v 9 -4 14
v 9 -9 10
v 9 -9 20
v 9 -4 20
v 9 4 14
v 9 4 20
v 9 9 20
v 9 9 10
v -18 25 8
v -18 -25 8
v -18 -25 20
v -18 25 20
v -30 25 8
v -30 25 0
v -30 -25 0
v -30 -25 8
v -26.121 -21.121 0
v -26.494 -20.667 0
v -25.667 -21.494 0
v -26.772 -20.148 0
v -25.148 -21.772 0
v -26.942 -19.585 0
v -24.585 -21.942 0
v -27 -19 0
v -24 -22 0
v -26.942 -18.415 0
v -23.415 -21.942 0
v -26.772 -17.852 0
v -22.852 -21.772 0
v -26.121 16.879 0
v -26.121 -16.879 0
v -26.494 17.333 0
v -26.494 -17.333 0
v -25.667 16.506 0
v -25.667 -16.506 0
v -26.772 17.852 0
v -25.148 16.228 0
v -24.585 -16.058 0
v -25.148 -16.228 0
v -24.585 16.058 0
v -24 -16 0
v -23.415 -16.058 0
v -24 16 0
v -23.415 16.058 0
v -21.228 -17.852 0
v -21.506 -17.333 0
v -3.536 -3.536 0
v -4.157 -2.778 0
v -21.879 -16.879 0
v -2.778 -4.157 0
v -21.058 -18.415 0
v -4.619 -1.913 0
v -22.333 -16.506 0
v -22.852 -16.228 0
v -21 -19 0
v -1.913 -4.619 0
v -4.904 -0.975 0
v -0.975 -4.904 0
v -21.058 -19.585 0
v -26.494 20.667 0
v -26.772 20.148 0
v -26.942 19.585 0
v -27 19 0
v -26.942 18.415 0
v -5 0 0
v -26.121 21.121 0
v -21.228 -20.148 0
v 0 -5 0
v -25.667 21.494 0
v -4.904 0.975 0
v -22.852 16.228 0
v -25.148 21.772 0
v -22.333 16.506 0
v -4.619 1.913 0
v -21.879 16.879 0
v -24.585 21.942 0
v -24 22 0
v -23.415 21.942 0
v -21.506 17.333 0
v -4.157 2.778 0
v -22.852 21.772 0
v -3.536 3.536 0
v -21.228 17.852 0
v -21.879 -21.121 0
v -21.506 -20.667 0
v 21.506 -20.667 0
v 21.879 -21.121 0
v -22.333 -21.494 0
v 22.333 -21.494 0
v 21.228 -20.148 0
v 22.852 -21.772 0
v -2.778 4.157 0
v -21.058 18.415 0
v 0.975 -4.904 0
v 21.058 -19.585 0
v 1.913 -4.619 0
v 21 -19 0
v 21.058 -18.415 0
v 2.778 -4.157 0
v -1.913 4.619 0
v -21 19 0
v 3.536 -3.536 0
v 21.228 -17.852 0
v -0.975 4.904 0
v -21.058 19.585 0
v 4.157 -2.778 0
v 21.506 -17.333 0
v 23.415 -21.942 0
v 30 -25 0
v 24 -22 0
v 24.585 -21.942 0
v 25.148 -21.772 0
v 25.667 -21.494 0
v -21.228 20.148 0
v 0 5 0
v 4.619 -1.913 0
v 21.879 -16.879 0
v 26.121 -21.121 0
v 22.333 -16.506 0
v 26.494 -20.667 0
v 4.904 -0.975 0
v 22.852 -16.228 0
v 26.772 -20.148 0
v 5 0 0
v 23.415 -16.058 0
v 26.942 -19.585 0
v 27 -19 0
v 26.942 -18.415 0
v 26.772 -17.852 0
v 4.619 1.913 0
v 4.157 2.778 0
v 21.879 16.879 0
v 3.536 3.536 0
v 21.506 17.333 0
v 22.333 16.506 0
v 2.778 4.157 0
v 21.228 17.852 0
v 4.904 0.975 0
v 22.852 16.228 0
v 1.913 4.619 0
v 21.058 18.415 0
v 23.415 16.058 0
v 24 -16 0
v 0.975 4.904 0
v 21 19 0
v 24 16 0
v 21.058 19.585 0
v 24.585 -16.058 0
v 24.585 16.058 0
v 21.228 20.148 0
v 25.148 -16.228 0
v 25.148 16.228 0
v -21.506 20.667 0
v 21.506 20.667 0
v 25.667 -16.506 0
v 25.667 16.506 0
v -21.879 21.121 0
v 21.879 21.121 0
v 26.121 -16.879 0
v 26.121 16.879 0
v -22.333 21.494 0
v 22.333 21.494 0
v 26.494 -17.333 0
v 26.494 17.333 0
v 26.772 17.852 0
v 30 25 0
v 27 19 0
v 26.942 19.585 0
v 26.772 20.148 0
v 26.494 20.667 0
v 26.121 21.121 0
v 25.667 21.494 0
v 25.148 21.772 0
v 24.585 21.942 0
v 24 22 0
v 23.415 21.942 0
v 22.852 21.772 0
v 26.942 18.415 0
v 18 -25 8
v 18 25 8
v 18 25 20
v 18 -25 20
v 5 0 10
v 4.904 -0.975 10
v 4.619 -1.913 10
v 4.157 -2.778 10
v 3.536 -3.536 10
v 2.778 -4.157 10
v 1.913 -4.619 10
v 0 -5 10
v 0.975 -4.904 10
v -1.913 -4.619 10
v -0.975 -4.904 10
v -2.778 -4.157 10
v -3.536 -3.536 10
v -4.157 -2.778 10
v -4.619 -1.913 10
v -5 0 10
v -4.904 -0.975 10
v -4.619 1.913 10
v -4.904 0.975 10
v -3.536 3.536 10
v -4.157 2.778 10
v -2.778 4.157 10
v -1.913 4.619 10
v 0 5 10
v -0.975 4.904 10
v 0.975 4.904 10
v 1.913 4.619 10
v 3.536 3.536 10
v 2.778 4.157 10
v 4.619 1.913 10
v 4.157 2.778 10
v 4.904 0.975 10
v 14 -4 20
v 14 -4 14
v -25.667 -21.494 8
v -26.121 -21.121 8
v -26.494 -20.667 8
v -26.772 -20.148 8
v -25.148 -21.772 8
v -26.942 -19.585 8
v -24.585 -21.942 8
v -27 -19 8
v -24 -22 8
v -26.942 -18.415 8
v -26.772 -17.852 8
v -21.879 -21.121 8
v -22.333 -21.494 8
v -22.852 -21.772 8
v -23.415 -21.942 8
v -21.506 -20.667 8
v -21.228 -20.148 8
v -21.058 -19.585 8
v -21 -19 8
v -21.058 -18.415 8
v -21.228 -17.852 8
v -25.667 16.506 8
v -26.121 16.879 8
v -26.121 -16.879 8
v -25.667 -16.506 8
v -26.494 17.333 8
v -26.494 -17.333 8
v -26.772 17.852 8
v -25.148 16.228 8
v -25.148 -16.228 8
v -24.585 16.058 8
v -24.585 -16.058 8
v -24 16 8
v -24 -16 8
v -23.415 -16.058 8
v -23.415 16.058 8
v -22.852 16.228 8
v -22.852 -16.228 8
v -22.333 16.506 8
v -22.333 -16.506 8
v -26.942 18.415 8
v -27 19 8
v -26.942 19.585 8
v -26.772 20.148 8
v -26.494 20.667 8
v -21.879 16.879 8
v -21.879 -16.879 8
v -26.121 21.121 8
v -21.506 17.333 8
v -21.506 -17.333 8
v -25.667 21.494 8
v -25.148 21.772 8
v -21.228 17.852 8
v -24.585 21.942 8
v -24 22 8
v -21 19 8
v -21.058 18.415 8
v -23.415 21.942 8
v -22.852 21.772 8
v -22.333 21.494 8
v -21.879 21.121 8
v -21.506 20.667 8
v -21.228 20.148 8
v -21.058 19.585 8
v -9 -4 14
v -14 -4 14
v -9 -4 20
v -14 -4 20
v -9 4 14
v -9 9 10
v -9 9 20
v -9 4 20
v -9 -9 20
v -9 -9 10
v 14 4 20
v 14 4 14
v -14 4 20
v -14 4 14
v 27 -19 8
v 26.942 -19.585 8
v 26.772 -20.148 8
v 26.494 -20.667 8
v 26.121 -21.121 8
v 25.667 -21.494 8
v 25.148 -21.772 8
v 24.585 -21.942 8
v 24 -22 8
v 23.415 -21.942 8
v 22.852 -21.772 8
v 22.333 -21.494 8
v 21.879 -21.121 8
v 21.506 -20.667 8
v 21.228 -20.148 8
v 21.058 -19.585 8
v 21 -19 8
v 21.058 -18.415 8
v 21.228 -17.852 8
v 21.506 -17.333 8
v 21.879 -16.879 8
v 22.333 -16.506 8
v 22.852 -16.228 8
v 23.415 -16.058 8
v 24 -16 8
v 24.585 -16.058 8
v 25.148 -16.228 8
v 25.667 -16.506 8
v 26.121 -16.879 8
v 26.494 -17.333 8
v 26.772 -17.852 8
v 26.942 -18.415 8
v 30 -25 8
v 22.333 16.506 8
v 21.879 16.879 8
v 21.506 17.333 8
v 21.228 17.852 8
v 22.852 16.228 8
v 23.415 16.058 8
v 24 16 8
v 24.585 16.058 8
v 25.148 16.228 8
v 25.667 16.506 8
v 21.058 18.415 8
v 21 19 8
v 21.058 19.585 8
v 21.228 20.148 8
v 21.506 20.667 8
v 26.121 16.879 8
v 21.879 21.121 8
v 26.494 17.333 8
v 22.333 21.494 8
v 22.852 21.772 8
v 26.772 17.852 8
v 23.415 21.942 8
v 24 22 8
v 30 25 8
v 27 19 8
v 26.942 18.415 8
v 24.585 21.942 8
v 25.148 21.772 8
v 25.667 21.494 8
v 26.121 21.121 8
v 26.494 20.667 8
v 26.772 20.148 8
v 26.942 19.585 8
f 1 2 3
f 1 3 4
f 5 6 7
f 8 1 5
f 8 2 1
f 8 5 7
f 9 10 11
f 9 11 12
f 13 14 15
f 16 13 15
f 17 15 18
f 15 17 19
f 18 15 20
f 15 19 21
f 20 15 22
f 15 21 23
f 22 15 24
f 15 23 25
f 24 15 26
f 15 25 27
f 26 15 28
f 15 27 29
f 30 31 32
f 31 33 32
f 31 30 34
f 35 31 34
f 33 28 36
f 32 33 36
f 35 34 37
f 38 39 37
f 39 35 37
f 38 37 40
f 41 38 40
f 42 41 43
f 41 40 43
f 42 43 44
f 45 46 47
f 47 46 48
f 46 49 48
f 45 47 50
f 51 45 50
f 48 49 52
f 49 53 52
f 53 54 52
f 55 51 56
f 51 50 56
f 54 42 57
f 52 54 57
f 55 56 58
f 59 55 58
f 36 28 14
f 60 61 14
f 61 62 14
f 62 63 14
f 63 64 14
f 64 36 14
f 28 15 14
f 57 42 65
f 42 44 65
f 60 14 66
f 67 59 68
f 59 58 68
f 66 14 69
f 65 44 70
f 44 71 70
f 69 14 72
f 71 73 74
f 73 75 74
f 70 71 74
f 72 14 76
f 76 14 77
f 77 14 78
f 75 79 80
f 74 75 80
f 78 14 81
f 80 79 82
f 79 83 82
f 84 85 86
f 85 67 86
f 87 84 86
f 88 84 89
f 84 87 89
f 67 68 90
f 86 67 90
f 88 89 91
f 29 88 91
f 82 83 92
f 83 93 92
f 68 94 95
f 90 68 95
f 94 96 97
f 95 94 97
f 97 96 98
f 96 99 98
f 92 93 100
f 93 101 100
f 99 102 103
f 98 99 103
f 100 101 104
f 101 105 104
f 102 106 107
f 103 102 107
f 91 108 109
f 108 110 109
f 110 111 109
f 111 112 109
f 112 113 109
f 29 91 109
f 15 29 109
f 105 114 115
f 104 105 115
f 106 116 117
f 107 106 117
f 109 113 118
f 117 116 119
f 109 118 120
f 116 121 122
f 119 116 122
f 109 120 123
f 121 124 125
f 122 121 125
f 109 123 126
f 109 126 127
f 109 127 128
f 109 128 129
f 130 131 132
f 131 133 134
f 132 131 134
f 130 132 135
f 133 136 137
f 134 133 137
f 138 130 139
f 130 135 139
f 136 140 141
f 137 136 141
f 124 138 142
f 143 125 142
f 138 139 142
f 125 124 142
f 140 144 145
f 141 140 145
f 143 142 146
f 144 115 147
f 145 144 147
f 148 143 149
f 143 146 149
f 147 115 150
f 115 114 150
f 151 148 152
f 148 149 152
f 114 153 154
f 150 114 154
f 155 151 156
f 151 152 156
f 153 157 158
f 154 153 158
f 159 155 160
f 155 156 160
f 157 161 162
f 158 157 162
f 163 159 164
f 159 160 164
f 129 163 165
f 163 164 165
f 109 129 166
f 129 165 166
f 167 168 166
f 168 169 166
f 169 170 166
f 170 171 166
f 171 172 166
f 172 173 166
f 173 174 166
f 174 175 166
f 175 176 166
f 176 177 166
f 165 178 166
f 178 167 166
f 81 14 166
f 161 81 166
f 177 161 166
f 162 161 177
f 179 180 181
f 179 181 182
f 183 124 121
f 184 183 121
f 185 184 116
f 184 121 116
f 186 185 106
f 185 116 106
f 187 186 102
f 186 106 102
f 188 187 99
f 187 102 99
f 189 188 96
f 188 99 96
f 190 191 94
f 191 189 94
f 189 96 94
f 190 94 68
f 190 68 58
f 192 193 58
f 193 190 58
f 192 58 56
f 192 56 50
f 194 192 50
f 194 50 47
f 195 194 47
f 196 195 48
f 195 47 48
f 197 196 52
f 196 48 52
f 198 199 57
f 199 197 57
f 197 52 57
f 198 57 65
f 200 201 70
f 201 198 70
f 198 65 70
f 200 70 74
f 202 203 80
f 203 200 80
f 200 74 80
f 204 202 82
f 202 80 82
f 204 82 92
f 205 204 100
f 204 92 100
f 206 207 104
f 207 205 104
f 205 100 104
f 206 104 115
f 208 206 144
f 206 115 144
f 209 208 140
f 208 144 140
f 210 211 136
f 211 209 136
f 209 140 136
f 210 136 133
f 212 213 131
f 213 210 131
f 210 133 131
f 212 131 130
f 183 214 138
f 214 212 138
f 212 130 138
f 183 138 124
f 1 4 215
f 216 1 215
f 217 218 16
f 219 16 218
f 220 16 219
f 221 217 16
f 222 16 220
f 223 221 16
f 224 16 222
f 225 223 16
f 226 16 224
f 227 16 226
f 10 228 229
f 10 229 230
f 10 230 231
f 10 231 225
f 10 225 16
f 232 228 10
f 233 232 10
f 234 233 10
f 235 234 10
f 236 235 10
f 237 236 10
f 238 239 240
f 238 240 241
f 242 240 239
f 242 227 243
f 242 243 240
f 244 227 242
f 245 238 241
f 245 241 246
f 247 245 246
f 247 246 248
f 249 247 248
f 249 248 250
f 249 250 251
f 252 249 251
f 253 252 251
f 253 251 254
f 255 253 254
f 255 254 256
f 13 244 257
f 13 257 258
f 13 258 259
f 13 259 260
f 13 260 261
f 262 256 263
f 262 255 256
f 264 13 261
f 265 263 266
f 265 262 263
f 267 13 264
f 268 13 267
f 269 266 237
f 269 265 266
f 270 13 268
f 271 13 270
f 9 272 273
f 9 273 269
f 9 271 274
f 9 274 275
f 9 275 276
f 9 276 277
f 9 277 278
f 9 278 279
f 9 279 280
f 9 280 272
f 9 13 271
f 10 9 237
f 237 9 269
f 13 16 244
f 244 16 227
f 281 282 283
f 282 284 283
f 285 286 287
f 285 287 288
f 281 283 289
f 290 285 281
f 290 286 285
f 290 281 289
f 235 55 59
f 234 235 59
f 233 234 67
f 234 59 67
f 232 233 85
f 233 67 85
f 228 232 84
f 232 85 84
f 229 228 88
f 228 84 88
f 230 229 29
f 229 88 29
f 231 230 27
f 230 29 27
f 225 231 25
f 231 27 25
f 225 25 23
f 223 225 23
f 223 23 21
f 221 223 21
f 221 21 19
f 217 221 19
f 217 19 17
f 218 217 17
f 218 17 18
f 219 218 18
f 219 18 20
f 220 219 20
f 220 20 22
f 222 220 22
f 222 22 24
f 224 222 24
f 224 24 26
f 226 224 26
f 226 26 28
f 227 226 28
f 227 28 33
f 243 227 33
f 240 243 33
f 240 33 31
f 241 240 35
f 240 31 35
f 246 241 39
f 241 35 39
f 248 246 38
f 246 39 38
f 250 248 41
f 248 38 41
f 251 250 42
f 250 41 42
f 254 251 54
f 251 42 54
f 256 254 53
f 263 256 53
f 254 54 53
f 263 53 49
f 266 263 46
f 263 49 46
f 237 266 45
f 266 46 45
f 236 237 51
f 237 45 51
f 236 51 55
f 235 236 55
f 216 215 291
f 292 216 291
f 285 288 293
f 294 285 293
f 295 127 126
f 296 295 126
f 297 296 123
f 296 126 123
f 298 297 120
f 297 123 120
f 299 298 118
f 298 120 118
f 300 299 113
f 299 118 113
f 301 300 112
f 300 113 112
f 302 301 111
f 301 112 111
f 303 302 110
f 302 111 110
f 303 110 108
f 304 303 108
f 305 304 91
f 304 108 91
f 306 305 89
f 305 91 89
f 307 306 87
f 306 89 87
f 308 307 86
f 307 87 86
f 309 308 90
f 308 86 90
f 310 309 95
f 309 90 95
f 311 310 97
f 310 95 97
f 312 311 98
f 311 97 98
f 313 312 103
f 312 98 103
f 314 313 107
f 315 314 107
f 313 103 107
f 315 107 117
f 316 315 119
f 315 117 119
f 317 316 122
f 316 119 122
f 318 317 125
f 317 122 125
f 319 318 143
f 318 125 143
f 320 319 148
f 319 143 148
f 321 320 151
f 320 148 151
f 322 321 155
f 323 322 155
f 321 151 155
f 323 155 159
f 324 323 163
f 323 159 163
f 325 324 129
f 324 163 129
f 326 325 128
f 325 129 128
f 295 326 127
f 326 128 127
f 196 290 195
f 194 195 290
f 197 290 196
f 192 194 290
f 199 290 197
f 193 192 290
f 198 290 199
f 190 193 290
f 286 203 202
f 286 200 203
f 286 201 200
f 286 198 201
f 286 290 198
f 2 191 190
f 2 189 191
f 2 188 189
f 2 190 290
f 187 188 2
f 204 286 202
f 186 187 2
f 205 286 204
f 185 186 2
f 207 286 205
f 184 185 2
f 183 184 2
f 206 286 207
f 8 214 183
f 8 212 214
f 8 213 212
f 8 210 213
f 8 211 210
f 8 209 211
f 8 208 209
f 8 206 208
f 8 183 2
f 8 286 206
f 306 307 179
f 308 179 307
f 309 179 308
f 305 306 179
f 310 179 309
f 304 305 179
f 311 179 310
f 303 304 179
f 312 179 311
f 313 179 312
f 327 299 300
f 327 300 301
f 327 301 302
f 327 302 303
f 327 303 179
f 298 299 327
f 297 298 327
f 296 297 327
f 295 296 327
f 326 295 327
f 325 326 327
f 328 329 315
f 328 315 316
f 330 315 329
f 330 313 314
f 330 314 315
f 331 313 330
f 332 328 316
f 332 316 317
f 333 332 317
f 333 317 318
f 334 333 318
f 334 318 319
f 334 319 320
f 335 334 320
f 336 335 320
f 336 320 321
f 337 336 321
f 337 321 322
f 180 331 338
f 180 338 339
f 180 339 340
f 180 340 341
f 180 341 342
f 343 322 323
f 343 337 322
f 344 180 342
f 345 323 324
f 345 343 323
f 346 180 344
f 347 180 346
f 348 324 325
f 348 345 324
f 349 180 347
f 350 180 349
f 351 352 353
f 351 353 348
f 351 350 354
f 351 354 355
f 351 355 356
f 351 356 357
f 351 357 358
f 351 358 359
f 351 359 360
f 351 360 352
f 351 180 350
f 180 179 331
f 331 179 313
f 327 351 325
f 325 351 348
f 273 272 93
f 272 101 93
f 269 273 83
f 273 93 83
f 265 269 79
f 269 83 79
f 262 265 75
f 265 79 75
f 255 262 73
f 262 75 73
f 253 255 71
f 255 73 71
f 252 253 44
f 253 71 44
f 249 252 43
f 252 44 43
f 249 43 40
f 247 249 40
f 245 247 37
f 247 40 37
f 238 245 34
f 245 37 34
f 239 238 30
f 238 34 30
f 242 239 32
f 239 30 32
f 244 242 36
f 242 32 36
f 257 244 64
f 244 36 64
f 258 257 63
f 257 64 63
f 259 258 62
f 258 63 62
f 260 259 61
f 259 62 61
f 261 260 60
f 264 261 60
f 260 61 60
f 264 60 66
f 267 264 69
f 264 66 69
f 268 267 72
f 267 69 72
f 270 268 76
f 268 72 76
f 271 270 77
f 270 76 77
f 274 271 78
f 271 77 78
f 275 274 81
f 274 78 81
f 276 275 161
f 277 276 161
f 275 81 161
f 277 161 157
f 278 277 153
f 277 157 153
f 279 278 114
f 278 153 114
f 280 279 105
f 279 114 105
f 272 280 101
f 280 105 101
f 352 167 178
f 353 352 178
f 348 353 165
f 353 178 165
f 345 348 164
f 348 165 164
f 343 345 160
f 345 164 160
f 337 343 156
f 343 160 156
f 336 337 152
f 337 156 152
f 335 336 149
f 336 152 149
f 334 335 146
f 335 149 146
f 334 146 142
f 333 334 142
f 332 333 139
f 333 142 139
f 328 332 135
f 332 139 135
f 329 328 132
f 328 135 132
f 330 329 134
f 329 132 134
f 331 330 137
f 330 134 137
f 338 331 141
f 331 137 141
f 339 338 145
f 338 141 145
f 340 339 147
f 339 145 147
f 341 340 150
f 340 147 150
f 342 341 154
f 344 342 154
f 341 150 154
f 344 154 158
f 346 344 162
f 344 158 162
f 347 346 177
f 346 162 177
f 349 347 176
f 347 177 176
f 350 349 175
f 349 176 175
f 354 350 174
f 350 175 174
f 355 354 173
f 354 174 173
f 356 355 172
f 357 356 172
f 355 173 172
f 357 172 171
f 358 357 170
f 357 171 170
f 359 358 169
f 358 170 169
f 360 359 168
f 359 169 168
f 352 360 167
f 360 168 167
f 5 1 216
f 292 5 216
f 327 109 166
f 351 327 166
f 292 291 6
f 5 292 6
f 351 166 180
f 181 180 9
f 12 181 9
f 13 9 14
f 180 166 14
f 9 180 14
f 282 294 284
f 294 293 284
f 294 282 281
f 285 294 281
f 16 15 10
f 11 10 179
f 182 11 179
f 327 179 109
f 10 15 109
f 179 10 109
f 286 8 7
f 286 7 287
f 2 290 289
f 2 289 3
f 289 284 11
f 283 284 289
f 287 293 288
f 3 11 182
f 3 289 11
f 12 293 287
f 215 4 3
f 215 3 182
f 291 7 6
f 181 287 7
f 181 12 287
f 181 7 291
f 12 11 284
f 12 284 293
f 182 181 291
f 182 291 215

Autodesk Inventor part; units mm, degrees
ref_plane "YZ Plane" through (0, 0, 0) normal (1, 0, 0) x (0, 1, 0)
ref_plane "XZ Plane" through (0, 0, 0) normal (0, 1, 0) x (-1, 0, 0)
ref_plane "XY Plane" through (0, 0, 0) normal (0, 0, 1) x (1, 0, 0)
sketch "podstawa" plane through (0, 0, 0) normal (0, 0, 1) x (1, 0, 0)
  line L0 (-30, -25) -> (30, -25)
  line L1 (30, -25) -> (30, 25)
  line L2 (30, 25) -> (-30, 25)
  line L3 (-30, 25) -> (-30, -25)
  circle A0 centre (0, 0) radius 5
  line L4 (0, 0) -> (24, 0) construction
  line L5 (24, 0) -> (24, 19) construction
  circle A1 centre (24, 19) radius 3
  line L6 (0, 25) -> (0, -25) construction
  circle A2 centre (-24, 19) radius 3
  line L7 (-30, 0) -> (30, 0) construction
  circle A3 centre (24, -19) radius 3
  circle A4 centre (-24, -19) radius 3
  dimension "d0" = 60
  dimension "d1" = 50
  dimension "d9" = 10
  dimension "d26" = 24
  dimension "d27" = 19
  dimension "d28" = 6
extrude "Wyciągnięcie proste1" add sketch "podstawa" along normal blind 8 contours L3 L2 L1 L0 | A1 | A2 | A3 | A4
sketch "nakladka" plane through (0, 0, 8) normal (0, 0, 1) x (1, 0, 0)
  line L0 (18, -25) -> (-18, -25)
  line L1 (-18, -25) -> (-18, 25)
  line L2 (-18, 25) -> (18, 25)
  line L3 (18, 25) -> (18, -25)
  line L4 (18, -25) -> (-18, 25) construction
  line L5 (-18, -25) -> (18, 25) construction
  line L6 (-9, -9) -> (9, -9)
  line L7 (9, -9) -> (9, 9)
  line L8 (9, 9) -> (-9, 9)
  line L9 (-9, 9) -> (-9, -9)
  line L10 (-9, -9) -> (9, 9) construction
  line L11 (9, -9) -> (-9, 9) construction
  point P0 (0, 0)
  dimension "d12" = 36
  dimension "d13" = 50
  dimension "d14" = 18
  dimension "d15" = 18
extrude "Wyciągnięcie proste2" add sketch "nakladka" along normal blind 12
sketch "srodek_2mm" plane through (0, 0, 8) normal (0, 0, 1) x (1, 0, 0)
  line L0 (-9, -9) -> (9, -9)
  line L1 (9, -9) -> (9, 9)
  line L2 (9, 9) -> (-9, 9)
  line L3 (-9, 9) -> (-9, -9)
  line L4 (-9, -9) -> (9, 9) construction
  line L5 (9, -9) -> (-9, 9) construction
  circle A0 centre (0, 0) radius 5
extrude "Wyciągnięcie proste3" add sketch "srodek_2mm" along normal blind 2
sketch "wyciecie_gora_6mm" plane through (0, 0, 20) normal (0, 0, 1) x (1, 0, 0)
  line L0 (-14, -4) -> (14, -4)
  line L1 (14, -4) -> (14, 4)
  line L2 (14, 4) -> (-14, 4)
  line L3 (-14, 4) -> (-14, -4)
  line L4 (-14, -4) -> (14, 4) construction
  line L5 (14, -4) -> (-14, 4) construction
  point P0 (0, 0)
  dimension "d20" = 28
  dimension "d21" = 8
extrude "Wyciągnięcie proste4" cut sketch "wyciecie_gora_6mm" against normal blind 6
extrude "Wyciągnięcie proste5" cut sketch "podstawa" along normal through all contours A1 | A2 | A3 | A4
properties part number "Bartosz_Zukowski_model_nr_7"
